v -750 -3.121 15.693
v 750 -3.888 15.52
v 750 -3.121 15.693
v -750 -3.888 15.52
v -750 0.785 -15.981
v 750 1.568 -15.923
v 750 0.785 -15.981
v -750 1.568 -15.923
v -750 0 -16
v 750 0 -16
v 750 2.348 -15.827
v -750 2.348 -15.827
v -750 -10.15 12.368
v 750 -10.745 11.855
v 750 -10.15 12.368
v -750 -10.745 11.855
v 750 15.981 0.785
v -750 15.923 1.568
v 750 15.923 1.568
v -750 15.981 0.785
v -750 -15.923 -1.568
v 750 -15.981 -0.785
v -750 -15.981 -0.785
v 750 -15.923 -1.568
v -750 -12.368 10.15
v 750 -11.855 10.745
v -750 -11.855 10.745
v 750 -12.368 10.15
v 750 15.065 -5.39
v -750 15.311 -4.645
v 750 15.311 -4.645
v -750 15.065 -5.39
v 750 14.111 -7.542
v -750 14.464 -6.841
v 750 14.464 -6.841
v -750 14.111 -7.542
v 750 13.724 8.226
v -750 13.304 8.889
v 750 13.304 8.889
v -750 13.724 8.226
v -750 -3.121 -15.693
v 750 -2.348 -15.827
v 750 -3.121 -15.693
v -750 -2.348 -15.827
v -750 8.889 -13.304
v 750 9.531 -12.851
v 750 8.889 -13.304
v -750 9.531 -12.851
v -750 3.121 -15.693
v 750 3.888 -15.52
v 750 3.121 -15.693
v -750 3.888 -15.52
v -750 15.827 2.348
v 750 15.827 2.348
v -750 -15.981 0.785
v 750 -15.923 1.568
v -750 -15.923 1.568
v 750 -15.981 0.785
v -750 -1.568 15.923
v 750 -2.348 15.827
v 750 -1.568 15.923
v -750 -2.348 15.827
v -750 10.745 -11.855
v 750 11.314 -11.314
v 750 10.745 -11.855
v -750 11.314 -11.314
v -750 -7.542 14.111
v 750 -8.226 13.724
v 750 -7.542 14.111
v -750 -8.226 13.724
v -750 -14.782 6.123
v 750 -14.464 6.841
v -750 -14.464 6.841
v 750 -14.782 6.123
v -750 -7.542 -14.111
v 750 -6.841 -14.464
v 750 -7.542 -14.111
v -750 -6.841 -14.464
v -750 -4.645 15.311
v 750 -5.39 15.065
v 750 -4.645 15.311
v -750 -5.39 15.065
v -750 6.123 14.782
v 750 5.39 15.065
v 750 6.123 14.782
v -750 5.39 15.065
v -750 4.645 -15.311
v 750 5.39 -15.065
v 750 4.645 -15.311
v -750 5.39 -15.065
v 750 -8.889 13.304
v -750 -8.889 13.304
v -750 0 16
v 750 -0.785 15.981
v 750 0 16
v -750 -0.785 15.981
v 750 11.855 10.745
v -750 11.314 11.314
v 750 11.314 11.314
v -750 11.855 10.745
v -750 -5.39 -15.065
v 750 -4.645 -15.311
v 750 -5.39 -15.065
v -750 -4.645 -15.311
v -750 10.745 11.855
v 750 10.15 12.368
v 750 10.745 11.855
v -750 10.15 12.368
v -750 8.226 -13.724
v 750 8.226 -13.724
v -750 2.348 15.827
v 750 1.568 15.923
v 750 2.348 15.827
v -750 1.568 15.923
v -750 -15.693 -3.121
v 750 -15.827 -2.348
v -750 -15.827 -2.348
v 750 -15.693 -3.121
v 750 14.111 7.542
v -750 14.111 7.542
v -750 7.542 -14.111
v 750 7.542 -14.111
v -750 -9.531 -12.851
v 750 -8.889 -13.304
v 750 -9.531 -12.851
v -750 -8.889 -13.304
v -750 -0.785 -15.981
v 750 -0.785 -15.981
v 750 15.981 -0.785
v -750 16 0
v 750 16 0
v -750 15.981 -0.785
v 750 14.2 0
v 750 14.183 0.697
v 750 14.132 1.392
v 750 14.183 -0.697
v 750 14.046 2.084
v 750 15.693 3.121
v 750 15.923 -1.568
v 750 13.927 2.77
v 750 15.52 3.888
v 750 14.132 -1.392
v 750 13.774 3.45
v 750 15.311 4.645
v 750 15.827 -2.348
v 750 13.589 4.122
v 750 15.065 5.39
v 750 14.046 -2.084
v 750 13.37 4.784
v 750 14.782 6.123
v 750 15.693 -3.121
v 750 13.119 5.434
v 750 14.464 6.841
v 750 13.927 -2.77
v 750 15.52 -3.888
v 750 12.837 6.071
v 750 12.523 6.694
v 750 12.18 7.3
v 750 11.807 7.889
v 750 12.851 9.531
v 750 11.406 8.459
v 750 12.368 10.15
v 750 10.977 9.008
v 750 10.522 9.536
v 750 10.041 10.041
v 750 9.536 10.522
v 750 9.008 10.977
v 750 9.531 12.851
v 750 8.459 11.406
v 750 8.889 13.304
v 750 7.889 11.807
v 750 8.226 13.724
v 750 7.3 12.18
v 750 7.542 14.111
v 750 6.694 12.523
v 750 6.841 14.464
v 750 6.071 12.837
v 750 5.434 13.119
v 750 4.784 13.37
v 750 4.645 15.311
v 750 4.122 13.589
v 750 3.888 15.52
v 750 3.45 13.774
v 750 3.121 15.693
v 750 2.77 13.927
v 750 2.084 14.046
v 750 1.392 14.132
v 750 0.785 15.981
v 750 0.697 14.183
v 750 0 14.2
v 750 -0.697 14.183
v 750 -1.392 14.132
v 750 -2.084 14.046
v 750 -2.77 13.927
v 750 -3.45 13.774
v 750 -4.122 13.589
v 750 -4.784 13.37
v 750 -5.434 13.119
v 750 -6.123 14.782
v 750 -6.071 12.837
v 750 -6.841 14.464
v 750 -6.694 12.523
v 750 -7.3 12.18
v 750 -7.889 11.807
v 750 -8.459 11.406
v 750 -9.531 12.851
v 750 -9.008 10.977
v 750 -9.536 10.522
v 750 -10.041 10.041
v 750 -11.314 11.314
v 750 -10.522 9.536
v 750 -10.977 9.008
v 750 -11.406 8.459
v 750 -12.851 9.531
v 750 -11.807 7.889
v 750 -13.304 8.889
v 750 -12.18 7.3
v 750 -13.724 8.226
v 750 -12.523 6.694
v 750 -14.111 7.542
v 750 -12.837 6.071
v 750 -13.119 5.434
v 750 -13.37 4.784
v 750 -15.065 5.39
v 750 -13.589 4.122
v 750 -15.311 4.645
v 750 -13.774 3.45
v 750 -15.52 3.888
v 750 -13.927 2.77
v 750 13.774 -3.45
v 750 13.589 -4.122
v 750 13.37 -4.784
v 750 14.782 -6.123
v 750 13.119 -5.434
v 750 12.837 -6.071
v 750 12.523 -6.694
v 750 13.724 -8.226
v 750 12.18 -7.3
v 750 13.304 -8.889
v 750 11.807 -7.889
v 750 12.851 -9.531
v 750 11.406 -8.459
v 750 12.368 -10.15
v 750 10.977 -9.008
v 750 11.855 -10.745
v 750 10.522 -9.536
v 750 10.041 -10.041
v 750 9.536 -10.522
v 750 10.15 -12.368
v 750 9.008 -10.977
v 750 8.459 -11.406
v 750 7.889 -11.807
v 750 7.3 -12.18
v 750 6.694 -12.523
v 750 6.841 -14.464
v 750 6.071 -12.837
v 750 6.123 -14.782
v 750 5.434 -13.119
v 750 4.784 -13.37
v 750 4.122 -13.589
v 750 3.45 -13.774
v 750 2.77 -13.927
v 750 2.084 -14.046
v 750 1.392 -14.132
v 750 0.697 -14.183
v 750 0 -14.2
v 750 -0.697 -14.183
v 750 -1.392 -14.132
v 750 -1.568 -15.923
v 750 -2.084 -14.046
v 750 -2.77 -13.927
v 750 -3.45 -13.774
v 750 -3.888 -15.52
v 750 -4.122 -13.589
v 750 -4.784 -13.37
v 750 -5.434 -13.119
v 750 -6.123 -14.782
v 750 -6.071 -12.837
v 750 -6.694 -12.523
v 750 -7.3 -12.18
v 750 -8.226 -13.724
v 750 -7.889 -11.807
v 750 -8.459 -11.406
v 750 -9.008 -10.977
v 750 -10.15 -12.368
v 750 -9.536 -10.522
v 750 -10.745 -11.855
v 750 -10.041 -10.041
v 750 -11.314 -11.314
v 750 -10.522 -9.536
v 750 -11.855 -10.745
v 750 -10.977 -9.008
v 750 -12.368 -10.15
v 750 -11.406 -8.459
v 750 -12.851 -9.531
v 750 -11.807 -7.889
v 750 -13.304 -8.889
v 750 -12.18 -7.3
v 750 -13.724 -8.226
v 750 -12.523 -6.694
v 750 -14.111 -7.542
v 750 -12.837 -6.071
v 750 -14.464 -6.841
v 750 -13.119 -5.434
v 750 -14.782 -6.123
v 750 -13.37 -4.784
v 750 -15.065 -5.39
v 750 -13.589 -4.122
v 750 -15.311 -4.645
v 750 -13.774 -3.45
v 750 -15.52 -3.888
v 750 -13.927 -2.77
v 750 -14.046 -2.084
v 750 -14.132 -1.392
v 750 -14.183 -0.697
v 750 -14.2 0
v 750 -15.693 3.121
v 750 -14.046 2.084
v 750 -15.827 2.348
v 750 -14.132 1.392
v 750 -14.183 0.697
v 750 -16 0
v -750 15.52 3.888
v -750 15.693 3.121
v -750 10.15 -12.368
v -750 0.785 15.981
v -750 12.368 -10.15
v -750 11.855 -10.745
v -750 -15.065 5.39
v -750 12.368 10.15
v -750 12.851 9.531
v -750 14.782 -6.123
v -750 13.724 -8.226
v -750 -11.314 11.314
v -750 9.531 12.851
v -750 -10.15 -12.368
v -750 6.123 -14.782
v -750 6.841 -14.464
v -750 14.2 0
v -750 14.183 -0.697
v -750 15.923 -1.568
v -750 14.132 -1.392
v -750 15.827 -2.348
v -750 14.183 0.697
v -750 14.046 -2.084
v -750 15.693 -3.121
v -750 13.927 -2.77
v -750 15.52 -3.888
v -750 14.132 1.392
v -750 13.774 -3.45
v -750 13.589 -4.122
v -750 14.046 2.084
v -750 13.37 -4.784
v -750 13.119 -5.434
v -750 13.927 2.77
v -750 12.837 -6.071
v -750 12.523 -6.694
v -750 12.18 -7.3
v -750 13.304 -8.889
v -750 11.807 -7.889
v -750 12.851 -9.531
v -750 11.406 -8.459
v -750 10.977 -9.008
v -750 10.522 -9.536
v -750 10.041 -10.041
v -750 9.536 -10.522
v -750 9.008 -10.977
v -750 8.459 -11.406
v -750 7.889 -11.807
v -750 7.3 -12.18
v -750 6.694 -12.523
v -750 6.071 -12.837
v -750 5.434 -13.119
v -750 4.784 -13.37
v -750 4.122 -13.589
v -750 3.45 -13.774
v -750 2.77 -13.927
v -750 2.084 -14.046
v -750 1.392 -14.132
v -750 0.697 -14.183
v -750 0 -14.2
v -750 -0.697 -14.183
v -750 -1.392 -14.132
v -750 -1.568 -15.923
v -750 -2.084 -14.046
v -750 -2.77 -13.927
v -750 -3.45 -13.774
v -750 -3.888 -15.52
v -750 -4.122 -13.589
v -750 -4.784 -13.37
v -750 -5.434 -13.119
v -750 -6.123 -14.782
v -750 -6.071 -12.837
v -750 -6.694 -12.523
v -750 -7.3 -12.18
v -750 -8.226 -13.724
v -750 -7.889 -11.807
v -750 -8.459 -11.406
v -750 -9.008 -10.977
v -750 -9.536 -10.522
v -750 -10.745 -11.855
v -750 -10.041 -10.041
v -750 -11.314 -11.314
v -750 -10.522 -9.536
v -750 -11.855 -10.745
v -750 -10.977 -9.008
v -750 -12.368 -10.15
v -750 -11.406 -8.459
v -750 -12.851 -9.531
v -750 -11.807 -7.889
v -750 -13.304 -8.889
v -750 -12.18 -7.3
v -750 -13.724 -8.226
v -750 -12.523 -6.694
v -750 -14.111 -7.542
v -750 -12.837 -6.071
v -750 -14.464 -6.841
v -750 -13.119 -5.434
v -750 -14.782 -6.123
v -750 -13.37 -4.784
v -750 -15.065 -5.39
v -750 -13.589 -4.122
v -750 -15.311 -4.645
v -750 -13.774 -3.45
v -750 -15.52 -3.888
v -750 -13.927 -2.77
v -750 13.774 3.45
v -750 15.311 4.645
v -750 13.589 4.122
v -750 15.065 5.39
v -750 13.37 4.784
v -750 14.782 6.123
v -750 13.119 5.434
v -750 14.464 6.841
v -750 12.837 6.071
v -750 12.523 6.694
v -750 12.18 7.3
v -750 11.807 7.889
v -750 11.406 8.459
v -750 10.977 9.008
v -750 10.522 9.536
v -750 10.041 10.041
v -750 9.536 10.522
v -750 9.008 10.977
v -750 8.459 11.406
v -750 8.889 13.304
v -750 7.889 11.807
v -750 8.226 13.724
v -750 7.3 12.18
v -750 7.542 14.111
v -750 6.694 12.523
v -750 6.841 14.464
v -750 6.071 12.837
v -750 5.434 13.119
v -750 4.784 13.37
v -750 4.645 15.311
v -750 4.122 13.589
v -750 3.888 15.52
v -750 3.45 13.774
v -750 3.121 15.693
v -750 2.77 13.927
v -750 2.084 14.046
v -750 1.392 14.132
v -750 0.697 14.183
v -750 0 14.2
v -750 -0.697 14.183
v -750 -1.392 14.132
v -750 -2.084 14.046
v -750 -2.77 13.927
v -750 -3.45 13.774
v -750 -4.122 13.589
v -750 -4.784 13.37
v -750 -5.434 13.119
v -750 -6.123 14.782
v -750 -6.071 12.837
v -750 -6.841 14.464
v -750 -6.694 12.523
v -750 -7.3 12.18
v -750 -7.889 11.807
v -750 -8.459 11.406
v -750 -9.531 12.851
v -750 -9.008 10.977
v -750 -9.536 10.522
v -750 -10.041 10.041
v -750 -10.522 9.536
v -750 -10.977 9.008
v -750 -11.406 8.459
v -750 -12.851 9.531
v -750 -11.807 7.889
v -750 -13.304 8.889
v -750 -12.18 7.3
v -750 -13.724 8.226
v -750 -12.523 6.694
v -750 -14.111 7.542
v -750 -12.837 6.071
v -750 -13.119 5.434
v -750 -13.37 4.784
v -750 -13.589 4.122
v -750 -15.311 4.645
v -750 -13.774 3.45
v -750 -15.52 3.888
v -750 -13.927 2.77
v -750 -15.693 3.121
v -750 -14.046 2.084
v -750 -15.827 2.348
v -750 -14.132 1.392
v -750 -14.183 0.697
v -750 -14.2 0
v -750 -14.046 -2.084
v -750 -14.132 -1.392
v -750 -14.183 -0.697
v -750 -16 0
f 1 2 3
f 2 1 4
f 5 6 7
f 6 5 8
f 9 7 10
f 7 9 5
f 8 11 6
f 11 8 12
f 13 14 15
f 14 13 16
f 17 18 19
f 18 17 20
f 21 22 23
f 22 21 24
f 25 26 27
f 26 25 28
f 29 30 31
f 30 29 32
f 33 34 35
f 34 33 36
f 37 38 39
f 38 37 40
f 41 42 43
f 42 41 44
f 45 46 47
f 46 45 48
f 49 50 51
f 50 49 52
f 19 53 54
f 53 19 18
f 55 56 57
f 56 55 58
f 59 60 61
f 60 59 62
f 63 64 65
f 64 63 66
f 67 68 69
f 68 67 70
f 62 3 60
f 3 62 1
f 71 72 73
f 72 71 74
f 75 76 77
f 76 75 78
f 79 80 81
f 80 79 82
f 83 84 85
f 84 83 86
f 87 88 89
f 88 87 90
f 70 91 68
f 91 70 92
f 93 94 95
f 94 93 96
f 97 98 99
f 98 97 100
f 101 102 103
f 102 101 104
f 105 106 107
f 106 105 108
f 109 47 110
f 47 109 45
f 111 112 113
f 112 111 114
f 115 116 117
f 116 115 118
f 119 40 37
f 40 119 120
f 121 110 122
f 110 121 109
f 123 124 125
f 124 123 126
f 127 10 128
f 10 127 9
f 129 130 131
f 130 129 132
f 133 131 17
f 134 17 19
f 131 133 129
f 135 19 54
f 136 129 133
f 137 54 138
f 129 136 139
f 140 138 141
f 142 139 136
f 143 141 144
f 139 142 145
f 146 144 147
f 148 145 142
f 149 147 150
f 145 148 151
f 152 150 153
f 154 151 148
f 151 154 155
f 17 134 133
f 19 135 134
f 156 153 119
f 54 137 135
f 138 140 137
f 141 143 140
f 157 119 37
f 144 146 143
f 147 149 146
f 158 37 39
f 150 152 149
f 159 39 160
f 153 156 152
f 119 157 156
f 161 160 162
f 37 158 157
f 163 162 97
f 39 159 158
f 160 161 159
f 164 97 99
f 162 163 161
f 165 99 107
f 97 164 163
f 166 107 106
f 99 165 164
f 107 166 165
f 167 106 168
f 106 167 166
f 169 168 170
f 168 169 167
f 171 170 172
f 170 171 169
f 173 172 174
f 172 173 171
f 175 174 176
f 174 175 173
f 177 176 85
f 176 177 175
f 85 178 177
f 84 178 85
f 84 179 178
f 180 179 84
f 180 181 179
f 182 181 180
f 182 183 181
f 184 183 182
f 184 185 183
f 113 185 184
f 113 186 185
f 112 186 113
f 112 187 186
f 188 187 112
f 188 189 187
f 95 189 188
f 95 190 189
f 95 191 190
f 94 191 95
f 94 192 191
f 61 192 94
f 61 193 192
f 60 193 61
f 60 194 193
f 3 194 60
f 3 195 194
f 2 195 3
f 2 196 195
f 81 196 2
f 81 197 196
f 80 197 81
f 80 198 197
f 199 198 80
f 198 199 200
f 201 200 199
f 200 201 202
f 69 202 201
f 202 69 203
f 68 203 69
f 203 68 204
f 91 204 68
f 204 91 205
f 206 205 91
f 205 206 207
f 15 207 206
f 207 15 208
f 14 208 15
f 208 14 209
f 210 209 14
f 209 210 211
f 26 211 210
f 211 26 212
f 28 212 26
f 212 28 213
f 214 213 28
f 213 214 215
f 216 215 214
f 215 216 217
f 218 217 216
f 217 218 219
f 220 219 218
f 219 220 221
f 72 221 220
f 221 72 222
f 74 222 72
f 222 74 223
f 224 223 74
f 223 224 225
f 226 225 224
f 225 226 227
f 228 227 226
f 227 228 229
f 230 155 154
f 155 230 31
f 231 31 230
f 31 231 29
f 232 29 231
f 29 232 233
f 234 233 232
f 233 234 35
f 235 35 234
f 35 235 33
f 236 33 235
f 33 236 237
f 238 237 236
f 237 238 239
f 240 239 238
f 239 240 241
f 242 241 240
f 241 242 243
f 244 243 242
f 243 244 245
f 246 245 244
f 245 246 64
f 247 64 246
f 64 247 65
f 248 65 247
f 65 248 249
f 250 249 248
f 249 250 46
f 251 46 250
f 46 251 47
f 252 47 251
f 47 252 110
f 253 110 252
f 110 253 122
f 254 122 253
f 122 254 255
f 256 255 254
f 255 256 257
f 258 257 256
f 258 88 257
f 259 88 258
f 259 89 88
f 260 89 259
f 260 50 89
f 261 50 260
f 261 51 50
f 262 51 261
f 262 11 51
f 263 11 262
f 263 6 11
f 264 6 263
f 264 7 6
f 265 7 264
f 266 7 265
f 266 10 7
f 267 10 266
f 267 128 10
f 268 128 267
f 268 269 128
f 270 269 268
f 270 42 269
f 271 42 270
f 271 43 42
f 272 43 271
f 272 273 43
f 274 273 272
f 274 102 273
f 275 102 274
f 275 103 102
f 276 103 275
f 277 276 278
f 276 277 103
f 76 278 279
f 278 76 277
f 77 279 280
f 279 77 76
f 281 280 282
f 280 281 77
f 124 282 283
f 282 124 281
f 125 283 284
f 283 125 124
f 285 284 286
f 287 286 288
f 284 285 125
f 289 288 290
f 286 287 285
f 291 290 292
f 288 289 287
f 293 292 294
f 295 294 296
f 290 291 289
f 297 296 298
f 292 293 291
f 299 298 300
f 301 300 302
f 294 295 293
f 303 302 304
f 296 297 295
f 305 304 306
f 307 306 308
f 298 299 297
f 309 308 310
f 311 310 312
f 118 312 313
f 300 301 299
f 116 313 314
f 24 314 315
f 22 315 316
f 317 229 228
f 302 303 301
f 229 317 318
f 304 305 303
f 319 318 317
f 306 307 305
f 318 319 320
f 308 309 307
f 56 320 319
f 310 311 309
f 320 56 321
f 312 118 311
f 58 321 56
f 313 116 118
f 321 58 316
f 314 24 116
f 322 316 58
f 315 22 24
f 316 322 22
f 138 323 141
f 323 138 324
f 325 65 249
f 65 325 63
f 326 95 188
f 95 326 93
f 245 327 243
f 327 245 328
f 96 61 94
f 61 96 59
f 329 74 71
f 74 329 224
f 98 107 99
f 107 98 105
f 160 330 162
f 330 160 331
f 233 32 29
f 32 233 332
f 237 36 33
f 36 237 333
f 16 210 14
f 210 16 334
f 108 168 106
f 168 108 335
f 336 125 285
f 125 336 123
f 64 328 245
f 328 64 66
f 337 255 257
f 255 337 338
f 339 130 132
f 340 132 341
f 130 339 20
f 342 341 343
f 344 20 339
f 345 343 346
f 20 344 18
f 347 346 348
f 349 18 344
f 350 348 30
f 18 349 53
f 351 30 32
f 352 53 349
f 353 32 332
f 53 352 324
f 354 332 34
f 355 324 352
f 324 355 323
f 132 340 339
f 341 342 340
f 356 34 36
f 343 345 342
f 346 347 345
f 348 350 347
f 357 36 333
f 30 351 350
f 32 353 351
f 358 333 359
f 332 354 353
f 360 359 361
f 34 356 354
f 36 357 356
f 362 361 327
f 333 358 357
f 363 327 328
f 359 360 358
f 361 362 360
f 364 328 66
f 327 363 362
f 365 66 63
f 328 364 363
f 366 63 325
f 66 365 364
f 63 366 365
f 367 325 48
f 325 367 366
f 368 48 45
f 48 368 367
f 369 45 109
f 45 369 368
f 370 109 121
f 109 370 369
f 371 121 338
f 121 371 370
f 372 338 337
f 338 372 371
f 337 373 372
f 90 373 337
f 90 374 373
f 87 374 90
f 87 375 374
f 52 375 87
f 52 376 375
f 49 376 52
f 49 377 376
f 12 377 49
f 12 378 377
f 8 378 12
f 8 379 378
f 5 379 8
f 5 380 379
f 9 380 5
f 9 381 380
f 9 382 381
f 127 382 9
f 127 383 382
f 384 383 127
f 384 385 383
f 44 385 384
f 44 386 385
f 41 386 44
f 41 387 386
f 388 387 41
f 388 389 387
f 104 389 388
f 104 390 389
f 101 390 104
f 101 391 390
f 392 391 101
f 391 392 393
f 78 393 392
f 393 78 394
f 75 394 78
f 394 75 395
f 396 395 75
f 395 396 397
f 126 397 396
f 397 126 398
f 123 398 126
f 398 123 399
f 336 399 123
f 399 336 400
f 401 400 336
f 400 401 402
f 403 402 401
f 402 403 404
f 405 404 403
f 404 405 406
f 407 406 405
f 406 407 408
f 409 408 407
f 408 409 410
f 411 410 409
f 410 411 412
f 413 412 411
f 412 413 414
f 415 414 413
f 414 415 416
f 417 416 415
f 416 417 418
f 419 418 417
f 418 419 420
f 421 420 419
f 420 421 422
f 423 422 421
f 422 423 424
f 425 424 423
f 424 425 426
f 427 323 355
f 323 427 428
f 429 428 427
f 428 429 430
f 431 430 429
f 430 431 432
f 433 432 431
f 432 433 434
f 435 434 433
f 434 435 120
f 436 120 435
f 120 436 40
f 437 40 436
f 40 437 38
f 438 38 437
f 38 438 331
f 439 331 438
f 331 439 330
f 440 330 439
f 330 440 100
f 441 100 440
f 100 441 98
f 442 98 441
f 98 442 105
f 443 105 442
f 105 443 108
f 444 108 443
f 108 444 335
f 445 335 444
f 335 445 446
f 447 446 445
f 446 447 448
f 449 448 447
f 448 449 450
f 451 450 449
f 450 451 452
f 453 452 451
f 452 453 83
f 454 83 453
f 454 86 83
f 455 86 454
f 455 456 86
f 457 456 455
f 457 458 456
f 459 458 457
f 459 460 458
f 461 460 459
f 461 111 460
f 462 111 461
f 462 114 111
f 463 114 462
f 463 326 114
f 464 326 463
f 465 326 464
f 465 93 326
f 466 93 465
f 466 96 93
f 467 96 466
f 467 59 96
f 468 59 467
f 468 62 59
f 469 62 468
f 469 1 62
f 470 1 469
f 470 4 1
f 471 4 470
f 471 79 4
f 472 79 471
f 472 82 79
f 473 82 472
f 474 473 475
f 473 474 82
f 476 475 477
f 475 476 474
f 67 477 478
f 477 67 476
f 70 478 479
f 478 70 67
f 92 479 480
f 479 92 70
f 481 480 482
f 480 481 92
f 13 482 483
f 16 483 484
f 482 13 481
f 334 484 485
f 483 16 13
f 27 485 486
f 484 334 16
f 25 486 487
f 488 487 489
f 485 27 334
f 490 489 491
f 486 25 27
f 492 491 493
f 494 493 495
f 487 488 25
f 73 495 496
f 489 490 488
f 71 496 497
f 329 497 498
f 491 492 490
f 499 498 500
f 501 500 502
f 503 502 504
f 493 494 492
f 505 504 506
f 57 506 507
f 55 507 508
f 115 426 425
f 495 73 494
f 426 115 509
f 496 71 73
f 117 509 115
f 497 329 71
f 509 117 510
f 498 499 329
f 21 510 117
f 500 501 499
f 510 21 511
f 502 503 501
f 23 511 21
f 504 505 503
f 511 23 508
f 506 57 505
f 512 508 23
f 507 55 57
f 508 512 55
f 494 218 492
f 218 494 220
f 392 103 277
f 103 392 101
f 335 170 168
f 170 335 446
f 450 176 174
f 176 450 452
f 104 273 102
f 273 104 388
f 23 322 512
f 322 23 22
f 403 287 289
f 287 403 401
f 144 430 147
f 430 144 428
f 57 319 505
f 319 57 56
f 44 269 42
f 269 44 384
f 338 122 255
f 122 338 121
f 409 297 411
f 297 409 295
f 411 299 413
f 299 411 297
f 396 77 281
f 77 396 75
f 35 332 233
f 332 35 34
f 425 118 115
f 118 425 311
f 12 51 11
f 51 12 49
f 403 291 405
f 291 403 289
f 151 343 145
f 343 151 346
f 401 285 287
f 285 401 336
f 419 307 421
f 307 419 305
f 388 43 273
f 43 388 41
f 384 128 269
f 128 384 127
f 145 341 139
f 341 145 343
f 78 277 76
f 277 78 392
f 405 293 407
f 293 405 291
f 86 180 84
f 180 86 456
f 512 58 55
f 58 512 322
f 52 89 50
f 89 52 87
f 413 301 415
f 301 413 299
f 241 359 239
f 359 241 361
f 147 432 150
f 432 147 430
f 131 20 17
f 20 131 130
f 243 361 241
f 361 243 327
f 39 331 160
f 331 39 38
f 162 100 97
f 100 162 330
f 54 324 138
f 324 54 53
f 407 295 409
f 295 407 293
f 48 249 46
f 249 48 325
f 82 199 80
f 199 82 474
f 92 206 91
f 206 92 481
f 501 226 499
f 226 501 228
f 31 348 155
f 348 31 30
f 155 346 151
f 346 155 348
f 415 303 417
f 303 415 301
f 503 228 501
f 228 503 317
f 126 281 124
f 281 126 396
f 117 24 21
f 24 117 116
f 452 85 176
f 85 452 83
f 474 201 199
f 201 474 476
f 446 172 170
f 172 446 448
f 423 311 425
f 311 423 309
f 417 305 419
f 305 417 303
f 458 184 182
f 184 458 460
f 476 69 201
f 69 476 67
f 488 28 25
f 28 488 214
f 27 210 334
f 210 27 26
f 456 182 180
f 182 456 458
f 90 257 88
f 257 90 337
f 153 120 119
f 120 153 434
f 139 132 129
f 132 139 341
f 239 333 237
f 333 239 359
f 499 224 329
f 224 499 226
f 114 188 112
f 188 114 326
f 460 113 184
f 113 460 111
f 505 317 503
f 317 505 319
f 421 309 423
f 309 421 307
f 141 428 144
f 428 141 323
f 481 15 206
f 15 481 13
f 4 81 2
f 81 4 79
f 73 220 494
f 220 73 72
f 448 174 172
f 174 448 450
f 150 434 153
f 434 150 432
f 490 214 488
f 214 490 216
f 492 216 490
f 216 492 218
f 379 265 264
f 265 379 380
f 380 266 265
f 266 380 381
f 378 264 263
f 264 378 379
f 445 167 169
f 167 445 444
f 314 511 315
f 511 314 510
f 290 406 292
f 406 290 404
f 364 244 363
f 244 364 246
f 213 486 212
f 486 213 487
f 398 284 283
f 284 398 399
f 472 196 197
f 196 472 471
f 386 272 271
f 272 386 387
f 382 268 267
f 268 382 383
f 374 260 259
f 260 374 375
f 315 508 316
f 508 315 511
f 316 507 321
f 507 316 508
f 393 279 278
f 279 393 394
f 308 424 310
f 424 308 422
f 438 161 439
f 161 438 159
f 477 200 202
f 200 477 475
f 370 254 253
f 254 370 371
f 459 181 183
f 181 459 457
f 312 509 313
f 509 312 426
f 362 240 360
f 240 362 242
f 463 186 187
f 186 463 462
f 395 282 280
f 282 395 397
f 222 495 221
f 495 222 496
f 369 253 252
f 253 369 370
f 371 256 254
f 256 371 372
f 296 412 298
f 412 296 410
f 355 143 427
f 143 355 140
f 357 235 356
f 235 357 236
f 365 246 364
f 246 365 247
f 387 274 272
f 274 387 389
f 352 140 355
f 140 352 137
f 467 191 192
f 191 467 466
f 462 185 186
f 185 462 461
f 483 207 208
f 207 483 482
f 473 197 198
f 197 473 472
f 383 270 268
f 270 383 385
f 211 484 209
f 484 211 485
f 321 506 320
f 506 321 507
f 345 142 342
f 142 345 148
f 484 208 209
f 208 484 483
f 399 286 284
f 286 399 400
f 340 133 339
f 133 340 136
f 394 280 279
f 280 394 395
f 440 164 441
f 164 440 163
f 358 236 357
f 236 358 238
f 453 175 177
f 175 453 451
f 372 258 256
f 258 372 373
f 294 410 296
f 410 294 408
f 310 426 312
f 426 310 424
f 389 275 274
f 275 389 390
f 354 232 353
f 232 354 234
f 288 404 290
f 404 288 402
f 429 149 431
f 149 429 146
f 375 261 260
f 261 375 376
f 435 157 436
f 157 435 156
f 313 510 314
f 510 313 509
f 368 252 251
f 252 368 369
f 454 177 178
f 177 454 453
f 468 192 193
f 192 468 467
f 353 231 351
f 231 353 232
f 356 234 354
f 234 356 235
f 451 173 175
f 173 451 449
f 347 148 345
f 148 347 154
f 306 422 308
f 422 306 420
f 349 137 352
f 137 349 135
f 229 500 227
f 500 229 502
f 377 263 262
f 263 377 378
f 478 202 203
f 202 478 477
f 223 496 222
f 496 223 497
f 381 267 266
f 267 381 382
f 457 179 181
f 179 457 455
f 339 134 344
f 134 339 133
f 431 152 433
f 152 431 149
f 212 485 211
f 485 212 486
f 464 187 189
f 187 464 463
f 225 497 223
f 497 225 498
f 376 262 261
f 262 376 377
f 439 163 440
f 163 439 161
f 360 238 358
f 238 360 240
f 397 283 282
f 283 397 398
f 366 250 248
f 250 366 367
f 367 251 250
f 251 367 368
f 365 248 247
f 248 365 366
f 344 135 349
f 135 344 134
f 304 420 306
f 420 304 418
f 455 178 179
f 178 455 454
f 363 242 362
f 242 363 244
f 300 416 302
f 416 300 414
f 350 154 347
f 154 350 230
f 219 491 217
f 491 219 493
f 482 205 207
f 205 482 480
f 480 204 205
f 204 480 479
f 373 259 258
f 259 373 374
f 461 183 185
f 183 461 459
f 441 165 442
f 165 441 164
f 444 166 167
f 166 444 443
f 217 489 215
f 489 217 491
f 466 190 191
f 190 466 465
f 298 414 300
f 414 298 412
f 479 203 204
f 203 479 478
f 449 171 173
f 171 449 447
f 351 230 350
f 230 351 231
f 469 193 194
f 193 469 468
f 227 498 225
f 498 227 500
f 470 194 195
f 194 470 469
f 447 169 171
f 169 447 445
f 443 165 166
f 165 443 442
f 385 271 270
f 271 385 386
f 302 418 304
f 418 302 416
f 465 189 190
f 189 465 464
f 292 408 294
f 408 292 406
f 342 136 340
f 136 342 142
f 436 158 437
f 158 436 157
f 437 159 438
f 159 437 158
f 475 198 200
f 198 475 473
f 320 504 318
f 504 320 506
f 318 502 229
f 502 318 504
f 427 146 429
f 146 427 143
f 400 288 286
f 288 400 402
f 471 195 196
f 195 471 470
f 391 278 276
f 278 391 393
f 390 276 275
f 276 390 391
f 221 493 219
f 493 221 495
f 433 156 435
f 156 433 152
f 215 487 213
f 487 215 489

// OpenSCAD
$fn = 128;

// HT 32 pipe (approx.): OD 32 mm, wall 1.8 mm, length 1500 mm
od = 32;
wall = 1.8;
id = od - 2*wall;
len = 1500;

module ht_pipe(od, id, len) {
    eps = 0.2; // small overlap to ensure clean boolean

    // Orient the pipe along X so front/back/left/right orthographic views show the 1500 mm length clearly
    rotate([0, 90, 0])
        difference() {
            cylinder(h=len, d=od, center=true);
            cylinder(h=len + 2*eps, d=id, center=true);
        }
}

ht_pipe(od, id, len);
